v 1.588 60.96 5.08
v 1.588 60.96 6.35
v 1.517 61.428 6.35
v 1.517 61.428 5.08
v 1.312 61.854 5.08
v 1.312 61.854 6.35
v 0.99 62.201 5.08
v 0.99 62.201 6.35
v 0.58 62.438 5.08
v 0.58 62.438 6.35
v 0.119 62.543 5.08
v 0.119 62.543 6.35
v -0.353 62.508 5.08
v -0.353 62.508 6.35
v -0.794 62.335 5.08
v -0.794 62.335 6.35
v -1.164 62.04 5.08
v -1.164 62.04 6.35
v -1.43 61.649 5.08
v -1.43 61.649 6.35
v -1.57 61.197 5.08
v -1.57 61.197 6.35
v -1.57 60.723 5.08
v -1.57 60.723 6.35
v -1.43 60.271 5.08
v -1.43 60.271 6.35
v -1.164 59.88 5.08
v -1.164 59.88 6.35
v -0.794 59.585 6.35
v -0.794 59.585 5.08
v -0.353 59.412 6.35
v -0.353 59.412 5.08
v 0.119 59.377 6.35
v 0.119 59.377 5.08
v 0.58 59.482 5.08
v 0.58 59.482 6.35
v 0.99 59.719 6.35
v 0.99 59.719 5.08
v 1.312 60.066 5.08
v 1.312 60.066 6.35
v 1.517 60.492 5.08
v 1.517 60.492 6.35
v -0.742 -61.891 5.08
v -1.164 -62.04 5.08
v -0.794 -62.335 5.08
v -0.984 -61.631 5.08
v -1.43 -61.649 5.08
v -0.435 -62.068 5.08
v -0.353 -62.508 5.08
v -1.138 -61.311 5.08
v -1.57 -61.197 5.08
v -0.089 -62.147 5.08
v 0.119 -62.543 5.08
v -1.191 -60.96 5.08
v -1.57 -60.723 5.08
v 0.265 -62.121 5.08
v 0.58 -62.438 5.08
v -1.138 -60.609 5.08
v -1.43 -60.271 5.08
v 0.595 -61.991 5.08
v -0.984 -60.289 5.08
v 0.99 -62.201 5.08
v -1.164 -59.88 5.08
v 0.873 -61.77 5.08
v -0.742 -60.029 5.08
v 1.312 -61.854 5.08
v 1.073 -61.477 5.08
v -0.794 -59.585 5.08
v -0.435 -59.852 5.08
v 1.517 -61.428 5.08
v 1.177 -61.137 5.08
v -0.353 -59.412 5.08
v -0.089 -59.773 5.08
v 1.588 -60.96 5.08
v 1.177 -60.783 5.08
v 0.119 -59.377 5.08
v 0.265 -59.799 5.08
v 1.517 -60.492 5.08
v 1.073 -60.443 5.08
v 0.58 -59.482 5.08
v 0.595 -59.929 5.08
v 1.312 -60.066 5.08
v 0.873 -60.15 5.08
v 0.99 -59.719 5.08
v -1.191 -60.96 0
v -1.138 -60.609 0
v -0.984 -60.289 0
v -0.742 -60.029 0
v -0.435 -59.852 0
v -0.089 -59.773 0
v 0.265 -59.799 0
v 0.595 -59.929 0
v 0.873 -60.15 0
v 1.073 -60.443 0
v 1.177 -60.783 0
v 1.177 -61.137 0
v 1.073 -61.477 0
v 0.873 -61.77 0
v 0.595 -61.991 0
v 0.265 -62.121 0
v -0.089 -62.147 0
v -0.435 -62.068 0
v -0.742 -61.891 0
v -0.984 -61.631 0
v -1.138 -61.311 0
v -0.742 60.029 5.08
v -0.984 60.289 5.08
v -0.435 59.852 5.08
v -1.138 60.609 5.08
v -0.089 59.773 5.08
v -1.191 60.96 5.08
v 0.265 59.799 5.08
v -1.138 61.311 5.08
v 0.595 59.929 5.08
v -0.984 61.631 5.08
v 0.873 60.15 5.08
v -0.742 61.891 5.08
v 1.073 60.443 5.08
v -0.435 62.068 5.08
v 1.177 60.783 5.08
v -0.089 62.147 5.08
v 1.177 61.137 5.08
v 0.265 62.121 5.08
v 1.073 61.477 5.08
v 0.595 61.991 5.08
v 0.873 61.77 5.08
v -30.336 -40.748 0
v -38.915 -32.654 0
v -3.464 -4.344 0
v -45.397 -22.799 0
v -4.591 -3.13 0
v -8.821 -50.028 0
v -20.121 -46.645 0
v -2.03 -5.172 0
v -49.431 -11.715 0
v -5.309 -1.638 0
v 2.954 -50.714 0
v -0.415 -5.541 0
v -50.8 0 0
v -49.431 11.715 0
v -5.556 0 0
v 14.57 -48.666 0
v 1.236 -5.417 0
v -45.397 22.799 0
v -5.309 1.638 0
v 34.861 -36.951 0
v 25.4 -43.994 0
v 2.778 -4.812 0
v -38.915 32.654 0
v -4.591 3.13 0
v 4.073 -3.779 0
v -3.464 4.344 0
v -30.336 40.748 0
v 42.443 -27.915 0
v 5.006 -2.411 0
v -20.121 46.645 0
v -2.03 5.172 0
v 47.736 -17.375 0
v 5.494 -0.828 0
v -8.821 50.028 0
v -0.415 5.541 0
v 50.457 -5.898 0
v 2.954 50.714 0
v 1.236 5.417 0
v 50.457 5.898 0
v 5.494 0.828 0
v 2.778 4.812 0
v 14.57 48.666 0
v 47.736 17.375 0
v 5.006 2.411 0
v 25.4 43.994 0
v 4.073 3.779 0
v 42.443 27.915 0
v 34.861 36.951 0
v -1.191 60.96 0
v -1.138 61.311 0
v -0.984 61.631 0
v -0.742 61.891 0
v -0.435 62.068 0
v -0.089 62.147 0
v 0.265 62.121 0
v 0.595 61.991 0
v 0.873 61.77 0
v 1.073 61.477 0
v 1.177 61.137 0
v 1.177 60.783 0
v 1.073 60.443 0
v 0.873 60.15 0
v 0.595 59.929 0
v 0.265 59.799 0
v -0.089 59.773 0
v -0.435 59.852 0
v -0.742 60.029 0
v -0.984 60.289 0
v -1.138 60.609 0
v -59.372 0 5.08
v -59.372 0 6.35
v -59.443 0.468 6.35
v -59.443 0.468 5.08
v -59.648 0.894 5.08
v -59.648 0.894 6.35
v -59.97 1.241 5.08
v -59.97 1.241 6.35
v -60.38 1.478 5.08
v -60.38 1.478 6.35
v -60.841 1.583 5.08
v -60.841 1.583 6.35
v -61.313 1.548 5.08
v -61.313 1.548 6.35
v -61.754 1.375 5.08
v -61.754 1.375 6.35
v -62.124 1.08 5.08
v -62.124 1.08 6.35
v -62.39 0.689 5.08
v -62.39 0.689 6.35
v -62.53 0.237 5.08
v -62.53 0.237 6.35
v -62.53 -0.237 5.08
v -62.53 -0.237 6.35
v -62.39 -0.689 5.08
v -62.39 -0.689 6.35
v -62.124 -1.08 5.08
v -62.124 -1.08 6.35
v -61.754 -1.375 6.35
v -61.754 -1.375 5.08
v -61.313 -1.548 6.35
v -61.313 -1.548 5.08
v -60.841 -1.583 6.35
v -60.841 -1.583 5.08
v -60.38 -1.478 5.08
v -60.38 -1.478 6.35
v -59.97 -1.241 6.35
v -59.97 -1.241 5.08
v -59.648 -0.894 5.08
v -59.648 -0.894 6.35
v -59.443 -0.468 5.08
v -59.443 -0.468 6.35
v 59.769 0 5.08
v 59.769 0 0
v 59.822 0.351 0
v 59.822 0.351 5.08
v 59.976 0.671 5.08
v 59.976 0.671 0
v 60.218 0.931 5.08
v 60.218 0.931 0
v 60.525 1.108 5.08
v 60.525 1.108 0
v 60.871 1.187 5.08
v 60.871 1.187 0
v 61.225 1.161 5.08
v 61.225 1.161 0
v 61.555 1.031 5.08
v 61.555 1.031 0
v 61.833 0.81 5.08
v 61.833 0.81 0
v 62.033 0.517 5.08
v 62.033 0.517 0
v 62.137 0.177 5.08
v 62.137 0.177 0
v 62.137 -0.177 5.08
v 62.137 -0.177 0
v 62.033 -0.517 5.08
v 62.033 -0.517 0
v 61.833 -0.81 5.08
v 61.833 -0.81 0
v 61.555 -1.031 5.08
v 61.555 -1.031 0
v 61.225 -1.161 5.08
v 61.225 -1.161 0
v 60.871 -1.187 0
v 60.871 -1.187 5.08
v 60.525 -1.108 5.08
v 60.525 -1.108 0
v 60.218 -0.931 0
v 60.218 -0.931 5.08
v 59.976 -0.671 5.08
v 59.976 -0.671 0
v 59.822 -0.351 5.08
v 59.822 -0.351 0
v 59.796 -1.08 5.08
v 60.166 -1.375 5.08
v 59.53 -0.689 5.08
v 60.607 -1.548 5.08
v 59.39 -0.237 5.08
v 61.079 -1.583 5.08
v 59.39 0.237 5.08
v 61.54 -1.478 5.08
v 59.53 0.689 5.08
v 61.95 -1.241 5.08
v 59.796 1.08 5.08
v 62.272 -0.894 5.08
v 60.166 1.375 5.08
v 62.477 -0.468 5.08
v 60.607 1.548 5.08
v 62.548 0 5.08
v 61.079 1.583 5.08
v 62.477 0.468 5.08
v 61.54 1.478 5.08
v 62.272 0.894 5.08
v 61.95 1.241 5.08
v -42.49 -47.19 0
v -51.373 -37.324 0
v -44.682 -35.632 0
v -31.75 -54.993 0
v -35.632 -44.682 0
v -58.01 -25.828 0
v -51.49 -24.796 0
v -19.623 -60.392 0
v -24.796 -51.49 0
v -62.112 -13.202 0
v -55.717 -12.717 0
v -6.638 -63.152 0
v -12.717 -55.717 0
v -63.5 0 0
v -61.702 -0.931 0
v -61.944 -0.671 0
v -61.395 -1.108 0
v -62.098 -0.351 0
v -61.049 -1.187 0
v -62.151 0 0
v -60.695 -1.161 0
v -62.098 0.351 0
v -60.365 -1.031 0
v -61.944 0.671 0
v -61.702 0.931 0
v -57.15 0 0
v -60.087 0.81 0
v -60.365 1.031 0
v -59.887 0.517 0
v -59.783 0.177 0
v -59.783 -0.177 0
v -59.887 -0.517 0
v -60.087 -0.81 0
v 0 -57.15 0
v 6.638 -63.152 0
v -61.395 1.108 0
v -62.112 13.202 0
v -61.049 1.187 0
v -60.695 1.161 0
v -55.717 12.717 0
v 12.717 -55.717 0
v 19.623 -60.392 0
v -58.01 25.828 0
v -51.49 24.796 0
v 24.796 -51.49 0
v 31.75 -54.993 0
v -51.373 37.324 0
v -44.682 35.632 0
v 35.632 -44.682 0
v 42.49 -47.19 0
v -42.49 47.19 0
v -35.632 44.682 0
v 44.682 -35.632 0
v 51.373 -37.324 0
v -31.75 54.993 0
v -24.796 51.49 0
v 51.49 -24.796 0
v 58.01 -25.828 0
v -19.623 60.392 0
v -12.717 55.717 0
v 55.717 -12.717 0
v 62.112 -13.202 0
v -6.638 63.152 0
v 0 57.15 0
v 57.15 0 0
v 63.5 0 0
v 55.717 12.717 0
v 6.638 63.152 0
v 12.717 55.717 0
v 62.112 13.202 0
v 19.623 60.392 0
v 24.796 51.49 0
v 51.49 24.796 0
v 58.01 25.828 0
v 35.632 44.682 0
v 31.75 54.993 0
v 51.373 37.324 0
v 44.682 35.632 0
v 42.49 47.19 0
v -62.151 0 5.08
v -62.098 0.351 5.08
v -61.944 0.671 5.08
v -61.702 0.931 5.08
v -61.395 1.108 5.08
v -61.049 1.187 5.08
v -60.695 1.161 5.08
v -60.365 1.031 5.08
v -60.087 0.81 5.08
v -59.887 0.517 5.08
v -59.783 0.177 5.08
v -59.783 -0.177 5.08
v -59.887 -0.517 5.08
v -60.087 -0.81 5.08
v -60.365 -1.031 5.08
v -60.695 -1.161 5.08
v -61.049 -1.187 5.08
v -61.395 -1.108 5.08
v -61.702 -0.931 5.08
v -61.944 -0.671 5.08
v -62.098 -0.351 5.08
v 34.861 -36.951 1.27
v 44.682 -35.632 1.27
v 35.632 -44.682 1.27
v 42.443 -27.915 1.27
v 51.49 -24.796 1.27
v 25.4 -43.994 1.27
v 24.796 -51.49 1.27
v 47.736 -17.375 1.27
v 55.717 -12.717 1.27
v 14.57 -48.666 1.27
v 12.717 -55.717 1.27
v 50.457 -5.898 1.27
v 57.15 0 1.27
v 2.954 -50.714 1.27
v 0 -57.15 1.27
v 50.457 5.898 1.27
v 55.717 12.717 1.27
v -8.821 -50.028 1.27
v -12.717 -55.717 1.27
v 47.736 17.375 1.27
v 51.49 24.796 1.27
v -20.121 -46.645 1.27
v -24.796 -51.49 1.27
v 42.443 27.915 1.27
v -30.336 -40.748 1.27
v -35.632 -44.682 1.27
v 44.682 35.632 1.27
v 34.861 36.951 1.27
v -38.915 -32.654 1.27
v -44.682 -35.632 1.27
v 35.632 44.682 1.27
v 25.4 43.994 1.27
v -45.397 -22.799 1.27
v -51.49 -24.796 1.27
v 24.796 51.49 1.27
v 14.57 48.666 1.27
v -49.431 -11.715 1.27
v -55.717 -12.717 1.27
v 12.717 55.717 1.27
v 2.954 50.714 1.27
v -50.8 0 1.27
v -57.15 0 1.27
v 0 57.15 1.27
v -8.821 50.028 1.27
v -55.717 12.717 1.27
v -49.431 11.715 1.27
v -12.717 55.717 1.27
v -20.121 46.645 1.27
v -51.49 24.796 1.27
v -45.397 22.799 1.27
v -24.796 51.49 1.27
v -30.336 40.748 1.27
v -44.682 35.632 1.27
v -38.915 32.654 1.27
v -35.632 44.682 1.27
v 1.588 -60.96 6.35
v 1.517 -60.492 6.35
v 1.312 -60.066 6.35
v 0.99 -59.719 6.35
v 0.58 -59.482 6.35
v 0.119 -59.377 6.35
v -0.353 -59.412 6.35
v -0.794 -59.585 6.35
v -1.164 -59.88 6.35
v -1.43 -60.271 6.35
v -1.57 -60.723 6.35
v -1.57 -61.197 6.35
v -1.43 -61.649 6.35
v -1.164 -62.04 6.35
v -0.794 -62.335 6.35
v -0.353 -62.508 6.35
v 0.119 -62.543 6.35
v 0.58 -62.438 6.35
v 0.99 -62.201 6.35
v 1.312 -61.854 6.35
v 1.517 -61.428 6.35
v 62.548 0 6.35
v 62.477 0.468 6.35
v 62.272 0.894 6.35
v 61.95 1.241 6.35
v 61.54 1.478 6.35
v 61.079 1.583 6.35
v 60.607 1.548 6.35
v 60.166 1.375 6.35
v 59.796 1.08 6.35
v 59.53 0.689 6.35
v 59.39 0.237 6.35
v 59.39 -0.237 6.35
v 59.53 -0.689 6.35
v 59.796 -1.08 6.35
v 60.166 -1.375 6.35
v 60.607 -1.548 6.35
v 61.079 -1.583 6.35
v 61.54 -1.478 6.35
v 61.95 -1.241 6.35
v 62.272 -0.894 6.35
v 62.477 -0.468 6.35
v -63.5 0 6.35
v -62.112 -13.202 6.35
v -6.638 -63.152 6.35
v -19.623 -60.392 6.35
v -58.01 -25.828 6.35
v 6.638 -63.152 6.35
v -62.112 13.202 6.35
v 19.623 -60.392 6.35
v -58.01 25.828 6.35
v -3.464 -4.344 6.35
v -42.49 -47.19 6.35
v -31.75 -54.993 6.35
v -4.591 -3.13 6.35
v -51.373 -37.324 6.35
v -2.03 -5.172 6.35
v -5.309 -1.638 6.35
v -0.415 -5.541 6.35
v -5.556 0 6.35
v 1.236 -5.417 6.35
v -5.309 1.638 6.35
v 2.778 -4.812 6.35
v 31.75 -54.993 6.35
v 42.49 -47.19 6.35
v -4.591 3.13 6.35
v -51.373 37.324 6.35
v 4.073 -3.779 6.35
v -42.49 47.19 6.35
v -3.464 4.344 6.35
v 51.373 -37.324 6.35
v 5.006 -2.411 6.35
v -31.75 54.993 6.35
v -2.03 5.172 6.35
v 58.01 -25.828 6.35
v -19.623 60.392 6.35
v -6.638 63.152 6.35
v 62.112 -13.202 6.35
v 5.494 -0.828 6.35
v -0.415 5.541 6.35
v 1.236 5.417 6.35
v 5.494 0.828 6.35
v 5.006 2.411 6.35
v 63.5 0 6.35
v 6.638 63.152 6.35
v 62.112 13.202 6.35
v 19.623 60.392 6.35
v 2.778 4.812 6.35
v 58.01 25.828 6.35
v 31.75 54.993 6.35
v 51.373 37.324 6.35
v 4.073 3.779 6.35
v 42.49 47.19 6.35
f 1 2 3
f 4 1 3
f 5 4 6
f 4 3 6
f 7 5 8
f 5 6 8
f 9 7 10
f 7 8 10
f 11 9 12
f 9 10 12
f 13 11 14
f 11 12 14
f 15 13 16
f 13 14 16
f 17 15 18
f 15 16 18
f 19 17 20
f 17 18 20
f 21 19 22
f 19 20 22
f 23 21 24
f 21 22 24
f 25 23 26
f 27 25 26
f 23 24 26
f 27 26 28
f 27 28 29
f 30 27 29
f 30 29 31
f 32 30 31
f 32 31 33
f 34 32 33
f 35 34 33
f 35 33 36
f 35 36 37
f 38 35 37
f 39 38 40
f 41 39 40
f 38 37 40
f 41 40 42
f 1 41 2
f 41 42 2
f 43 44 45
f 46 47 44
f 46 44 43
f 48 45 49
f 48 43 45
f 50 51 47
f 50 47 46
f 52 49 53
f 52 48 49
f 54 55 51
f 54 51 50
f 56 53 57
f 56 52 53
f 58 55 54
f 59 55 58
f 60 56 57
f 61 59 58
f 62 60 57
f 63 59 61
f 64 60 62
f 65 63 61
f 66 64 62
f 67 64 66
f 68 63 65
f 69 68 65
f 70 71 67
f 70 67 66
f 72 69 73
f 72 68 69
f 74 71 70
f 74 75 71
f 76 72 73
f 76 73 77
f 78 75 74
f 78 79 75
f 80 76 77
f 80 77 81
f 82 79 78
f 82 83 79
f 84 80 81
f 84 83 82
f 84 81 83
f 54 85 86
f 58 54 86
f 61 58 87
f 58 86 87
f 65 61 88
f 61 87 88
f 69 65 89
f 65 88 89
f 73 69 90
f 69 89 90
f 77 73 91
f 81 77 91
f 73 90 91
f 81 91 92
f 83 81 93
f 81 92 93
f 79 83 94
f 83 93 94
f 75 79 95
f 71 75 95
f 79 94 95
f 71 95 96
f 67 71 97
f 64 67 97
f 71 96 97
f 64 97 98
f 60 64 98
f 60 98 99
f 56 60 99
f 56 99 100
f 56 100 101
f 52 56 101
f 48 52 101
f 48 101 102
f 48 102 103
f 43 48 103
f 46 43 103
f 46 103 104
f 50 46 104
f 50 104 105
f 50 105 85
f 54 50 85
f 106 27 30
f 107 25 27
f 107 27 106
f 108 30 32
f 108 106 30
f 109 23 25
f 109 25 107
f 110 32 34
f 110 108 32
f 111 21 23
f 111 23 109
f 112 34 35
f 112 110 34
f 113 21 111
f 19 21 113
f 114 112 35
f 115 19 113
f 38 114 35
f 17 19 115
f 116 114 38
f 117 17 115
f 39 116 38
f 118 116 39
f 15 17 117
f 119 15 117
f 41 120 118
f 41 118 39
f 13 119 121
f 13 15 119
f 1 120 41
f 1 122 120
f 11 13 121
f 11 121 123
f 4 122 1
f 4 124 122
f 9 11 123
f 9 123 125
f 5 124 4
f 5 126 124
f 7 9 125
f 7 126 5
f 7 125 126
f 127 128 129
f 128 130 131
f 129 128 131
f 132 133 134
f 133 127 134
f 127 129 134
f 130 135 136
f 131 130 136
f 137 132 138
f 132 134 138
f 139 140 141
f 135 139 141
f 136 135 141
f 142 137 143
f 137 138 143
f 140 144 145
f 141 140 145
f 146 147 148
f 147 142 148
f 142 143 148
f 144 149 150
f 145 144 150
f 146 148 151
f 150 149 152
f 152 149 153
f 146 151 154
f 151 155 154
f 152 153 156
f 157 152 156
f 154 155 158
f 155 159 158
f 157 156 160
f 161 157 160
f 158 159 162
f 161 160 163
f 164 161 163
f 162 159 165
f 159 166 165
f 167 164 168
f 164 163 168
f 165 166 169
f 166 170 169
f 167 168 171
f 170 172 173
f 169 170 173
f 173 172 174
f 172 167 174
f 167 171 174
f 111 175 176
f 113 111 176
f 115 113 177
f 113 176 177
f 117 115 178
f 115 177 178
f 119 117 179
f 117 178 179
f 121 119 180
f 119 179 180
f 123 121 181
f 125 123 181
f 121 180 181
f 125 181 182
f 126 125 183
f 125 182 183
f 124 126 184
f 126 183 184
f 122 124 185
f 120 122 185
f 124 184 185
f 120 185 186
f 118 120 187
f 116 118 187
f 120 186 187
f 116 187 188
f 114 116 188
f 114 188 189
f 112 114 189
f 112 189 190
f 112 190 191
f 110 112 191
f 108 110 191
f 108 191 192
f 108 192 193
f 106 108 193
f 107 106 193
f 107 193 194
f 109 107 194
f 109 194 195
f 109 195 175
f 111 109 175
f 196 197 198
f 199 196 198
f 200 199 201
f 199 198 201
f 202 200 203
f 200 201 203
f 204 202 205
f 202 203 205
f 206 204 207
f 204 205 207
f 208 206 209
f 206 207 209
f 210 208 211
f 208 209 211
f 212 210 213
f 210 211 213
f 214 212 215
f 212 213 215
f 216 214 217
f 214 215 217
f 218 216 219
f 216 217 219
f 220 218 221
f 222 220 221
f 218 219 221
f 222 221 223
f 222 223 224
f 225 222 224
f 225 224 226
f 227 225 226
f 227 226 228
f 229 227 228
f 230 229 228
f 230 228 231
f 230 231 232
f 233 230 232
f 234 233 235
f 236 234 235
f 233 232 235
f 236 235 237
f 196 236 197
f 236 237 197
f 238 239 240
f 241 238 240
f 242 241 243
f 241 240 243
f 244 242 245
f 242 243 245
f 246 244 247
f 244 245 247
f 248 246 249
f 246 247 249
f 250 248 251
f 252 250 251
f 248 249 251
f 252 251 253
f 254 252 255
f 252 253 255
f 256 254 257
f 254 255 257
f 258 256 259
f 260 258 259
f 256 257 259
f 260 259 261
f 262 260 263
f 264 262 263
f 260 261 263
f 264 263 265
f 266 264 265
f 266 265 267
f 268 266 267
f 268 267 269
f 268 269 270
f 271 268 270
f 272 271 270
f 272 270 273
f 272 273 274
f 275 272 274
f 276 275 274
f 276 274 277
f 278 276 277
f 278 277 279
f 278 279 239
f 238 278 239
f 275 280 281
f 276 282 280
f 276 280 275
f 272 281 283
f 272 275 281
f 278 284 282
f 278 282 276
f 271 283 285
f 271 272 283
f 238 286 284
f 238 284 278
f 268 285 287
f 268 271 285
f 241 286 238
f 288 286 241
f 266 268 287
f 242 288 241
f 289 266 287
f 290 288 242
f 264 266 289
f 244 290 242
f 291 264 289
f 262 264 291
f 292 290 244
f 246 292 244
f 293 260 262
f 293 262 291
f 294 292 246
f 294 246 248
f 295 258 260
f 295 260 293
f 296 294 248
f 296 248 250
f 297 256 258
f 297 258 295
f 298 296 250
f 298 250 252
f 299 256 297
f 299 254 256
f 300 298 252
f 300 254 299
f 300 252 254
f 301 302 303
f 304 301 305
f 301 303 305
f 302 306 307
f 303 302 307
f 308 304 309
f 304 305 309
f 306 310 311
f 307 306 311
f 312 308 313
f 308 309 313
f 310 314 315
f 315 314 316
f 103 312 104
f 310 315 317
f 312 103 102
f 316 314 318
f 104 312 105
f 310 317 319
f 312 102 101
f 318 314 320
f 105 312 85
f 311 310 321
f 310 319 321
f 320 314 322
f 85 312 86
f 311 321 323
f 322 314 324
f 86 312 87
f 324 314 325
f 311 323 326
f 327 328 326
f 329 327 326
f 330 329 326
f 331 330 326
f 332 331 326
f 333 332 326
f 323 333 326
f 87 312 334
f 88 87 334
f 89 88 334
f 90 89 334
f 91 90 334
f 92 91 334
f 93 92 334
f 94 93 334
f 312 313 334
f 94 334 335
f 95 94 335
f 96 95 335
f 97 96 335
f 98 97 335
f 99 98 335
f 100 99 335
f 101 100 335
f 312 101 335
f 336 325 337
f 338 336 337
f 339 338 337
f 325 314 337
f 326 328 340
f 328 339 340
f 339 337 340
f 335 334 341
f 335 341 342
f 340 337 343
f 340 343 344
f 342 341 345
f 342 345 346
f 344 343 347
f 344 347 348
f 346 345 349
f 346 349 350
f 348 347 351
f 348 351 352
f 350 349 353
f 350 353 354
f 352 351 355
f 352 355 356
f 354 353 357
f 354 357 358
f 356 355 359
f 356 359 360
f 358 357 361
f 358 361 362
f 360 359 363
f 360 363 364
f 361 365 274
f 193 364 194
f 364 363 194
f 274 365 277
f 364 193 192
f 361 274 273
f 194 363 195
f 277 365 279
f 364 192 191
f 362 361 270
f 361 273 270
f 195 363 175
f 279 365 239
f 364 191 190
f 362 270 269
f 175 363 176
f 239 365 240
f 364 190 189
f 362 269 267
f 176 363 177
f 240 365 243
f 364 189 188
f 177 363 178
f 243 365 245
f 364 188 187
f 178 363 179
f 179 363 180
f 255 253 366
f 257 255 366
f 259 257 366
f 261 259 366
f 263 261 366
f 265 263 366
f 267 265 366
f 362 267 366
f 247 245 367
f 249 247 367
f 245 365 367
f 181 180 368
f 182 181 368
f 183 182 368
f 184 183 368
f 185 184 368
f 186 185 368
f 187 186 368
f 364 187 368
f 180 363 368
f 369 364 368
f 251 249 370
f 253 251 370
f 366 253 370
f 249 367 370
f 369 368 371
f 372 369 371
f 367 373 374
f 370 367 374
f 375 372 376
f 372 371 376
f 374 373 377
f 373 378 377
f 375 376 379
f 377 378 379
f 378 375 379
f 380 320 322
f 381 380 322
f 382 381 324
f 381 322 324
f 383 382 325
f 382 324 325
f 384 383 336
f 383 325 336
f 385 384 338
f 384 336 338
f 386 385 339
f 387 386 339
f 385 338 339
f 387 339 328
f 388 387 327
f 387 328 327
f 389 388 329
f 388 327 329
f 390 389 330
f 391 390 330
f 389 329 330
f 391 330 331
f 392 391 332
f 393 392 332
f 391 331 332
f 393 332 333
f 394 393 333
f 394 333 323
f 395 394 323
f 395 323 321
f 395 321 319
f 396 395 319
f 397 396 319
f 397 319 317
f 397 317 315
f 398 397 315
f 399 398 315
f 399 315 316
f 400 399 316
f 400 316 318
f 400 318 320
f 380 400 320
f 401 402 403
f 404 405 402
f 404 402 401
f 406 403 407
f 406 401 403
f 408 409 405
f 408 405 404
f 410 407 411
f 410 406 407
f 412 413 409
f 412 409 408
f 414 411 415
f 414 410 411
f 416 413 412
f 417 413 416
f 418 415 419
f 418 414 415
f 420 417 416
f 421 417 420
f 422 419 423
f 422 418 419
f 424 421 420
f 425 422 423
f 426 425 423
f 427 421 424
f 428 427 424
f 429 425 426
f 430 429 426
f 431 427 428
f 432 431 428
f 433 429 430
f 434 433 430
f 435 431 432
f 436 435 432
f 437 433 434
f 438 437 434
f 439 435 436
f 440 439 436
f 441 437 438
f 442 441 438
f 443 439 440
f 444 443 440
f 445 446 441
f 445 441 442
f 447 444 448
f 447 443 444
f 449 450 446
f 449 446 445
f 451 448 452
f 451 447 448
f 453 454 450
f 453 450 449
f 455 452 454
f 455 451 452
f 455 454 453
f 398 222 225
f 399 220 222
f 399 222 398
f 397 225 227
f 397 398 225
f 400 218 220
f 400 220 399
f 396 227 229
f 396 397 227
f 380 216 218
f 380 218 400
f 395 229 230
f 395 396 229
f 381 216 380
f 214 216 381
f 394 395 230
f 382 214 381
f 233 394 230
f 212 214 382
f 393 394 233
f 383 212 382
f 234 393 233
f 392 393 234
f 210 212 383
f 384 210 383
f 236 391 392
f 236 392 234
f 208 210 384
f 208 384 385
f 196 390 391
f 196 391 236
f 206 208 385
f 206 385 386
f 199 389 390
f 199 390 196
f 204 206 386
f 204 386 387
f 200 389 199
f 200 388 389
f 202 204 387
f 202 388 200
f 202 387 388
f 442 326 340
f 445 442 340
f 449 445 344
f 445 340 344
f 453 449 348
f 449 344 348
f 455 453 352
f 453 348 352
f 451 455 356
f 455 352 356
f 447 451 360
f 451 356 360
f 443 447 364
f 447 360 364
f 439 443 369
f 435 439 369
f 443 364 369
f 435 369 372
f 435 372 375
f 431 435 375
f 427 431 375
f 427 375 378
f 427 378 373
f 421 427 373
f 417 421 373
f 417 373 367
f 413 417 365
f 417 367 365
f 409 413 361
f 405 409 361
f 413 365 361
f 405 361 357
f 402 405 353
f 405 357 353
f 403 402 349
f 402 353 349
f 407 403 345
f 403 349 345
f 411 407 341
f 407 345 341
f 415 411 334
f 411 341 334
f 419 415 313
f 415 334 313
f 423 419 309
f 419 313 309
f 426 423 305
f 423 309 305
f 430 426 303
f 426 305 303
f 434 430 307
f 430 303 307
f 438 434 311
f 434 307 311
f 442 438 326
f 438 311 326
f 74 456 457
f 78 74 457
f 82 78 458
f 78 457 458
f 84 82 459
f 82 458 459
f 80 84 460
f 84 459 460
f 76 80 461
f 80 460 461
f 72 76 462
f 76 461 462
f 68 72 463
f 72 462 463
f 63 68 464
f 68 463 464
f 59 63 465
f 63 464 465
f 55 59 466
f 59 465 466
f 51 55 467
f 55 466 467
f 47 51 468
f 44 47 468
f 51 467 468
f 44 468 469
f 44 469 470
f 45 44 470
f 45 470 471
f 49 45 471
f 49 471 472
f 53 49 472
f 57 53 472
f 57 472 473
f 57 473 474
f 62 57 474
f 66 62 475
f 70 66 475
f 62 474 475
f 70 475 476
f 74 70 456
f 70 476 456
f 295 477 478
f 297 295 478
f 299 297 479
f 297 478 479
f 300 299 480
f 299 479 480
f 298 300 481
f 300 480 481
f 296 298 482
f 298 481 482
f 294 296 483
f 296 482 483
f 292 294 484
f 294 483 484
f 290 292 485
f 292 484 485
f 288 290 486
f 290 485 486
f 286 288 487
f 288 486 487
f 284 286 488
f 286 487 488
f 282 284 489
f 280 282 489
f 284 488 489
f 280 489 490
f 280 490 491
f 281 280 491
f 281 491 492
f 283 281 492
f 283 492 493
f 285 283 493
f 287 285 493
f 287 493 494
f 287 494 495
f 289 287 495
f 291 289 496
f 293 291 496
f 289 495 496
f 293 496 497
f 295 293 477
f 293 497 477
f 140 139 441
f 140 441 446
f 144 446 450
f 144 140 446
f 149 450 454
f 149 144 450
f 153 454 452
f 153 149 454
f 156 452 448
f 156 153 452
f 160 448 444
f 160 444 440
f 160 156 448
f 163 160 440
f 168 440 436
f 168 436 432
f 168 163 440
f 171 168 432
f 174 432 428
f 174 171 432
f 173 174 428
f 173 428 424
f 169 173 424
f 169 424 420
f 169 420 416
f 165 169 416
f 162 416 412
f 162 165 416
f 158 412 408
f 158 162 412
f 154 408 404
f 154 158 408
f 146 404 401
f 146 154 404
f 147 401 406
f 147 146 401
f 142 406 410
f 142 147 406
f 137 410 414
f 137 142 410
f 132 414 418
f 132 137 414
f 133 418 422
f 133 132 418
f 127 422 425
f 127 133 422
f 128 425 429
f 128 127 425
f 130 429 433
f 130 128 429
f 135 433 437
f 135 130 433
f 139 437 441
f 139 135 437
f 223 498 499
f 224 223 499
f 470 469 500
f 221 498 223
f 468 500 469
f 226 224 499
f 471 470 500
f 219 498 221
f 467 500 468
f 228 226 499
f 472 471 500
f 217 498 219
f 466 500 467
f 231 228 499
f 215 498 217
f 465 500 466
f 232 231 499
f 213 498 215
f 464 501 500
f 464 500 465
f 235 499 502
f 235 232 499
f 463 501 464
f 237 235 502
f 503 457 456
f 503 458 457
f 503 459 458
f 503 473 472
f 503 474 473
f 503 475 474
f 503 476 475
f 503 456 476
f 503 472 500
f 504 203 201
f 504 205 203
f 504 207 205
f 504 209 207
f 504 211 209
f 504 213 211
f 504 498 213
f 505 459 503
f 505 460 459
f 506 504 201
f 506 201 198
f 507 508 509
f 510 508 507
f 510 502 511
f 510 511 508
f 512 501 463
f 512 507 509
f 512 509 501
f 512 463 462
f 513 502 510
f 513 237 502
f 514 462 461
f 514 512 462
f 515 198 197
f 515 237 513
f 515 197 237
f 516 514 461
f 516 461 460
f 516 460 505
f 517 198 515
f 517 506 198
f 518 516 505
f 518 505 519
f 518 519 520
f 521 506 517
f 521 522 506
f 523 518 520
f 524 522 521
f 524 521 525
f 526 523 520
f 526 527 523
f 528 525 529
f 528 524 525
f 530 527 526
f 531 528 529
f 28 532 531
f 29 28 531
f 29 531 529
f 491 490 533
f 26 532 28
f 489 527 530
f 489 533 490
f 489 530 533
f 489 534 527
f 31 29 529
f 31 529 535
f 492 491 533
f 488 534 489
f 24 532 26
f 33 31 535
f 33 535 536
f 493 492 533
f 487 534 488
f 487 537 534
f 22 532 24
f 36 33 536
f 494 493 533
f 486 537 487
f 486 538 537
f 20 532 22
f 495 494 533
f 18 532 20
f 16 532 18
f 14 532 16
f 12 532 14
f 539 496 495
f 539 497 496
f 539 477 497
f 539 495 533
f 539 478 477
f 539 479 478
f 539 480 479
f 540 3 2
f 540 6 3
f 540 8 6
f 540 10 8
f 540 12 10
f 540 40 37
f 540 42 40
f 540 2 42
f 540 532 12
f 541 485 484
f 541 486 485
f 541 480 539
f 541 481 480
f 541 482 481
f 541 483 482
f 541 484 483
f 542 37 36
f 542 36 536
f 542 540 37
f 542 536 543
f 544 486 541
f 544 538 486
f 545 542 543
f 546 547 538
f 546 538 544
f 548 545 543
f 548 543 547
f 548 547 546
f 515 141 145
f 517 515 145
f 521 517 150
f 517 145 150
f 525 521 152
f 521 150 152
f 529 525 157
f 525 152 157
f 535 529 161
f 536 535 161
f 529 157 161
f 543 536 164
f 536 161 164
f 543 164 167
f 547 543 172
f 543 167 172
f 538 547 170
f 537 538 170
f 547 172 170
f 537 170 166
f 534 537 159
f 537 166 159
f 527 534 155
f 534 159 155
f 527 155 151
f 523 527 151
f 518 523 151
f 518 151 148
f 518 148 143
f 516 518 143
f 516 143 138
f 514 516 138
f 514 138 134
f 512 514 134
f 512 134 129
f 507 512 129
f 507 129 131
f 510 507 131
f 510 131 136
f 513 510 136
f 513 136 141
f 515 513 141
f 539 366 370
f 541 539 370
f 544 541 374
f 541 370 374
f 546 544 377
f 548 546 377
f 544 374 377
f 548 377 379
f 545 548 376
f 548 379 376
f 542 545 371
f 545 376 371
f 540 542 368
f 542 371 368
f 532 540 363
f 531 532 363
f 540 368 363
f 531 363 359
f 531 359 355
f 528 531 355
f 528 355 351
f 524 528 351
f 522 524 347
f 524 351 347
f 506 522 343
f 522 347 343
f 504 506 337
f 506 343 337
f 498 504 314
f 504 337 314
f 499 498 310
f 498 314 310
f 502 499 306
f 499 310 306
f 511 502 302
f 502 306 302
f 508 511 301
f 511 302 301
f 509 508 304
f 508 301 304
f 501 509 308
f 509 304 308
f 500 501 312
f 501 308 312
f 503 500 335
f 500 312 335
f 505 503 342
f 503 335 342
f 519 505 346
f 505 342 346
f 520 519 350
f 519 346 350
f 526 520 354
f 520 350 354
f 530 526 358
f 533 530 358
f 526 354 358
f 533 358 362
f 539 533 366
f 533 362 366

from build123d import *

# Parameters (mm, degrees)
SKETCH1_R           = 63.5
BOSS_EXTRUDE1_DEPTH = 6.35
SKETCH2_R           = 57.15
SKETCH2_R_2         = 50.8
CUT_EXTRUDE1_DEPTH  = 1.27
SKETCH4_R           = 1.190625
CUT_EXTRUDE2_DEPTH  = 91.02678768
SKETCH5_R           = 1.5875
CUT_EXTRUDE3_DEPTH  = 1.27
SKETCH6_R           = 5.55625
CUT_EXTRUDE4_DEPTH  = 91.02678768


with BuildPart() as part:
    # Sketch1 → Boss-Extrude1 (new body)
    with BuildSketch(Plane.XY):
        Circle(SKETCH1_R)
    extrude(amount=BOSS_EXTRUDE1_DEPTH)

    # Sketch2 → Cut-Extrude1 (cut)
    with BuildSketch(Plane(origin=(0, 0, 0), x_dir=(-1, 0, 0), z_dir=(0, 0, -1))):
        Circle(SKETCH2_R)
        Circle(SKETCH2_R_2, mode=Mode.SUBTRACT)
    extrude(amount=-CUT_EXTRUDE1_DEPTH, mode=Mode.SUBTRACT)

    # Sketch4 → Cut-Extrude2 (cut, through all)
    with BuildSketch(Plane(origin=(0, 0, 0), x_dir=(-1, 0, 0), z_dir=(0, 0, -1))):
        with Locations((0, 60.96)):
            Circle(SKETCH4_R)
        with Locations((60.96, 0)):
            Circle(SKETCH4_R)
        with Locations((0, -60.96)):
            Circle(SKETCH4_R)
        with Locations((-60.96, 0)):
            Circle(SKETCH4_R)
    extrude(amount=-CUT_EXTRUDE2_DEPTH, mode=Mode.SUBTRACT)

    # Sketch5 → Cut-Extrude3 (cut)
    with BuildSketch(Plane.XY.offset(6.35)):
        with Locations((0, 60.96)):
            Circle(SKETCH5_R)
        with Locations((60.96, 0)):
            Circle(SKETCH5_R)
        with Locations((0, -60.96)):
            Circle(SKETCH5_R)
        with Locations((-60.96, 0)):
            Circle(SKETCH5_R)
    extrude(amount=-CUT_EXTRUDE3_DEPTH, mode=Mode.SUBTRACT)

    # Sketch6 → Cut-Extrude4 (cut, through all)
    with BuildSketch(Plane(origin=(0, 0, 0), x_dir=(-1, 0, 0), z_dir=(0, 0, -1))):
        Circle(SKETCH6_R)
    extrude(amount=-CUT_EXTRUDE4_DEPTH, mode=Mode.SUBTRACT)


solid = part.part
